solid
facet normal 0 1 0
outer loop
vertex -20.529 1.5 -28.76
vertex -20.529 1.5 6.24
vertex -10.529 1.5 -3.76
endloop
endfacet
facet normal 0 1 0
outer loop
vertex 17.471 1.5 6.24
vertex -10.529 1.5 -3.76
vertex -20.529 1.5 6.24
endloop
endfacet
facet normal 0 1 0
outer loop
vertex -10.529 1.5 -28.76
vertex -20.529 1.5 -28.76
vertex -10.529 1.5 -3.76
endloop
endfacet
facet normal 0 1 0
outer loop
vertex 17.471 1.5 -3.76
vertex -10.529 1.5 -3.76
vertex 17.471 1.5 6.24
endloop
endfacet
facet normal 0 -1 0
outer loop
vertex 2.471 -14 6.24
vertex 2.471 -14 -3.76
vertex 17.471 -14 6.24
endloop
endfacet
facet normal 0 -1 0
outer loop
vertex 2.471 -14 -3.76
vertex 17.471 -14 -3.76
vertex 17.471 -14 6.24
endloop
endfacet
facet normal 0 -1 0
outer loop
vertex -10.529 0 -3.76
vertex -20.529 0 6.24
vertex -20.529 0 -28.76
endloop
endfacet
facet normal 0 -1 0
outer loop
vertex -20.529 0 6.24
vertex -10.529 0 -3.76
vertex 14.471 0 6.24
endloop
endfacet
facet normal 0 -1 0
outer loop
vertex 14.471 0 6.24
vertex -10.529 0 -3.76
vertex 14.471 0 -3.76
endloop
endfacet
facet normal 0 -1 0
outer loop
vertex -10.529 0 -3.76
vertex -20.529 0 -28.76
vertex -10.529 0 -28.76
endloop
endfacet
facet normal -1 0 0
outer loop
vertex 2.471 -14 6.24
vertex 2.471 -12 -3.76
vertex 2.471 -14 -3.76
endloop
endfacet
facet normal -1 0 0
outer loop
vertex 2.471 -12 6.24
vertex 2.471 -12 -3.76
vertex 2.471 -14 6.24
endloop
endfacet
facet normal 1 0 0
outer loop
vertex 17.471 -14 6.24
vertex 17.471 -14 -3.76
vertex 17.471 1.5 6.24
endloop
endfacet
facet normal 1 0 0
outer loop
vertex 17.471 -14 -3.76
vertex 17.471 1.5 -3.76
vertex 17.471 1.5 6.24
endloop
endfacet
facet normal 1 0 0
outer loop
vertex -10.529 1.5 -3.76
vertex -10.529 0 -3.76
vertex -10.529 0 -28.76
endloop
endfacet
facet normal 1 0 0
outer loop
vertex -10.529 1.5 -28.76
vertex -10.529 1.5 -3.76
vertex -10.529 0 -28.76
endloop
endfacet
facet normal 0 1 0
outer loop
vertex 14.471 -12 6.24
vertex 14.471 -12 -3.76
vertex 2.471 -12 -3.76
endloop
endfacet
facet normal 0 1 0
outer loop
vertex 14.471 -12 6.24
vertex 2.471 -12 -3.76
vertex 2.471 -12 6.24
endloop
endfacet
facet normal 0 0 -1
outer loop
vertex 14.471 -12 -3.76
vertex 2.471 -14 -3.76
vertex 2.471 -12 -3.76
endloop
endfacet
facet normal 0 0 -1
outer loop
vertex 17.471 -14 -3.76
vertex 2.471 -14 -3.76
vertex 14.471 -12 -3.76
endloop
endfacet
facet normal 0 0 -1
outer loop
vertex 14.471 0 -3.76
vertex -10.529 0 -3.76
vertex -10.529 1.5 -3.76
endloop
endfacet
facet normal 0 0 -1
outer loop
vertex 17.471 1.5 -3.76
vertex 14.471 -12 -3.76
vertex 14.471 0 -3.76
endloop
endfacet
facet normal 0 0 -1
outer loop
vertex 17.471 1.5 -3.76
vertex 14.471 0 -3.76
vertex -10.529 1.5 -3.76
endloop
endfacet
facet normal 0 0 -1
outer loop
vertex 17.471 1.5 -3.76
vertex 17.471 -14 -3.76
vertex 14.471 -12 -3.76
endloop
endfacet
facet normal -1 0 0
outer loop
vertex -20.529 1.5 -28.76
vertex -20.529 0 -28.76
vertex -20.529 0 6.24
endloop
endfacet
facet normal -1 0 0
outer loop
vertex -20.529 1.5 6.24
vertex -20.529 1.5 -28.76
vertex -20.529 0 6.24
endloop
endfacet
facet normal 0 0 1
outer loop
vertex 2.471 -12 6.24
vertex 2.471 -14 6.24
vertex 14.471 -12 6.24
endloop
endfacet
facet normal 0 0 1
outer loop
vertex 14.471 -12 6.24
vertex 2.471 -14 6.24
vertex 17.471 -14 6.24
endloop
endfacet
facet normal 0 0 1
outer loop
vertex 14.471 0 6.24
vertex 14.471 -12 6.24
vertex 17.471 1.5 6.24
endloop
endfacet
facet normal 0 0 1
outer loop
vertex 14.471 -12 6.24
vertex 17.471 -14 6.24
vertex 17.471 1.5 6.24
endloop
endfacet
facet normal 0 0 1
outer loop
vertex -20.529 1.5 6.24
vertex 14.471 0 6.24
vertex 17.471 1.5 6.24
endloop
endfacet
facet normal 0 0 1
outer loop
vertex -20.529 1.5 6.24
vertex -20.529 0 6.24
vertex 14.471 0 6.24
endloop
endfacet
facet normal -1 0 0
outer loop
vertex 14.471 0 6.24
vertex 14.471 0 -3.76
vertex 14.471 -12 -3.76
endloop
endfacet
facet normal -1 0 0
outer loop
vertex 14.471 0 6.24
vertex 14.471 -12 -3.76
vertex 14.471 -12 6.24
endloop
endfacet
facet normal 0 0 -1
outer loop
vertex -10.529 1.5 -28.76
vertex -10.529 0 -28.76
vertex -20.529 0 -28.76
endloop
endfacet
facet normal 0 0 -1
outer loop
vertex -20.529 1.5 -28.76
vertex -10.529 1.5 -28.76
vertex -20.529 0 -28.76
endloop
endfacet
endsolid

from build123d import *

# Parameters (mm, degrees)
BOSS_EXTRUDE1_DEPTH = 1.5
SKETCH2_W           = 3
SKETCH2_H           = 10
BOSS_EXTRUDE2_DEPTH = 14
SKETCH3_W           = 10
SKETCH3_H           = 2
BOSS_EXTRUDE3_DEPTH = 12


with BuildPart() as part:
    # Sketch1 → Boss-Extrude1 (new body)
    with BuildSketch(Plane(origin=(0, 0, 0), x_dir=(1, 0, 0), z_dir=(0, 1, 0))):
        Polygon((-10.528994658, 3.760355235), (-10.528994658, 28.760355235), (-20.528994658, 28.760355235), (-20.528994658, -6.239644765), (17.471005342, -6.239644765), (17.471005342, 3.760355235), align=None)
    extrude(amount=BOSS_EXTRUDE1_DEPTH)

    # Sketch2 → Boss-Extrude2 (add)
    with BuildSketch(Plane.XZ):
        with Locations((15.971005342, 1.239644765)):
            Rectangle(SKETCH2_W, SKETCH2_H)
    extrude(amount=BOSS_EXTRUDE2_DEPTH)

    # Sketch3 → Boss-Extrude3 (add)
    with BuildSketch(Plane.ZY.offset(-14.471005342)):
        with Locations((1.239644765, -13)):
            Rectangle(SKETCH3_W, SKETCH3_H)
    extrude(amount=BOSS_EXTRUDE3_DEPTH)


solid = part.part
